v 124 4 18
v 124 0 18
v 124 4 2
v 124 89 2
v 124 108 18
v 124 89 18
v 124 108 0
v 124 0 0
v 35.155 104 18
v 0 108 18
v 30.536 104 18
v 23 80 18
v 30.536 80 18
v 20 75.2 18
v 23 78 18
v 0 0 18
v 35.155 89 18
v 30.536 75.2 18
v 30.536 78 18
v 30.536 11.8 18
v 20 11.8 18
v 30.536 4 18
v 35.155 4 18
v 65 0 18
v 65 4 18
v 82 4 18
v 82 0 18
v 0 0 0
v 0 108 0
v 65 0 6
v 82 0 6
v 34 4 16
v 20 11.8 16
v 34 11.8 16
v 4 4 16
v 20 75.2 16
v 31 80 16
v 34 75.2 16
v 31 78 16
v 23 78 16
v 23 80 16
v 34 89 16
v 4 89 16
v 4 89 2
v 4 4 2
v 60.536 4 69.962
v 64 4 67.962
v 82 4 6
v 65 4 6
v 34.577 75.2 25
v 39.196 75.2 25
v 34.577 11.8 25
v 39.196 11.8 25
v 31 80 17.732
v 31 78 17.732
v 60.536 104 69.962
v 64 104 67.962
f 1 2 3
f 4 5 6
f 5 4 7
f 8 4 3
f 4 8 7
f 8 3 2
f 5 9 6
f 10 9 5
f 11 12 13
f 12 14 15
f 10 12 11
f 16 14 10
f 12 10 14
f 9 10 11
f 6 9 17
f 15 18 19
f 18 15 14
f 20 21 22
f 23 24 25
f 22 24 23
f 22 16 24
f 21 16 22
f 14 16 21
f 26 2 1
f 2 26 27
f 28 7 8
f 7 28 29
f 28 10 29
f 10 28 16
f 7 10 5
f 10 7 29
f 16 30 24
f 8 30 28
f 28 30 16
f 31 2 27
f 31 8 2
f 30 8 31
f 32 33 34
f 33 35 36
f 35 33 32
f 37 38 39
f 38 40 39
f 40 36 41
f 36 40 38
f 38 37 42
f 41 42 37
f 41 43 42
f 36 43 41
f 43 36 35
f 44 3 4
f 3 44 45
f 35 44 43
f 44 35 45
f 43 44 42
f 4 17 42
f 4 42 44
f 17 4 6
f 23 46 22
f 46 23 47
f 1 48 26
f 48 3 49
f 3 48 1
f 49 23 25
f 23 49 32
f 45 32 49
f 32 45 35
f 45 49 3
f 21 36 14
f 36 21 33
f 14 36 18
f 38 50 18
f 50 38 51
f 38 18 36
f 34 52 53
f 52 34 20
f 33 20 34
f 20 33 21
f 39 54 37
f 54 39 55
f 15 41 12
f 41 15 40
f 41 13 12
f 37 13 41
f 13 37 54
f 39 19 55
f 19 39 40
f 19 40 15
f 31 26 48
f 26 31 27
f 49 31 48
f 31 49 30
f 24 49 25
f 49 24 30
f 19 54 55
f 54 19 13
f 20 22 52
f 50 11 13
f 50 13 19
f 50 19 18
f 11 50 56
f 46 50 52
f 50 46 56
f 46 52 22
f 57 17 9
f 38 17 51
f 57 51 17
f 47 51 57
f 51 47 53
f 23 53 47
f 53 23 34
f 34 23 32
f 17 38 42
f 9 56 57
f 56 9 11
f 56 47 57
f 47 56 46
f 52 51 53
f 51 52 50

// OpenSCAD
difference() {
    union() {
        cube([124,108,18]);
        
        
    }
    
    translate([4,4,2])
    cube([121,85,14]);      // in
    
    translate([20,11.8,16])
    cube([105,63.4,3]);     // switch
    
    translate([23,78,16])
    cube([8,2,3]);          // LED
    
    translate([34,4,16])
    cube([121,85,3]);      // module
    
    translate([65,-1,6])
    cube([17,6,13]);       // serial
}

difference() {
    translate([34,4,16])
    rotate(a=60,v=[0,-1,0]) {
        cube([60,100,4]);
    }
    
    translate([20,11.8,16])
    cube([105,63.4,9]);      // switch
    
    translate([20,0,18]);
    //cube([
}
